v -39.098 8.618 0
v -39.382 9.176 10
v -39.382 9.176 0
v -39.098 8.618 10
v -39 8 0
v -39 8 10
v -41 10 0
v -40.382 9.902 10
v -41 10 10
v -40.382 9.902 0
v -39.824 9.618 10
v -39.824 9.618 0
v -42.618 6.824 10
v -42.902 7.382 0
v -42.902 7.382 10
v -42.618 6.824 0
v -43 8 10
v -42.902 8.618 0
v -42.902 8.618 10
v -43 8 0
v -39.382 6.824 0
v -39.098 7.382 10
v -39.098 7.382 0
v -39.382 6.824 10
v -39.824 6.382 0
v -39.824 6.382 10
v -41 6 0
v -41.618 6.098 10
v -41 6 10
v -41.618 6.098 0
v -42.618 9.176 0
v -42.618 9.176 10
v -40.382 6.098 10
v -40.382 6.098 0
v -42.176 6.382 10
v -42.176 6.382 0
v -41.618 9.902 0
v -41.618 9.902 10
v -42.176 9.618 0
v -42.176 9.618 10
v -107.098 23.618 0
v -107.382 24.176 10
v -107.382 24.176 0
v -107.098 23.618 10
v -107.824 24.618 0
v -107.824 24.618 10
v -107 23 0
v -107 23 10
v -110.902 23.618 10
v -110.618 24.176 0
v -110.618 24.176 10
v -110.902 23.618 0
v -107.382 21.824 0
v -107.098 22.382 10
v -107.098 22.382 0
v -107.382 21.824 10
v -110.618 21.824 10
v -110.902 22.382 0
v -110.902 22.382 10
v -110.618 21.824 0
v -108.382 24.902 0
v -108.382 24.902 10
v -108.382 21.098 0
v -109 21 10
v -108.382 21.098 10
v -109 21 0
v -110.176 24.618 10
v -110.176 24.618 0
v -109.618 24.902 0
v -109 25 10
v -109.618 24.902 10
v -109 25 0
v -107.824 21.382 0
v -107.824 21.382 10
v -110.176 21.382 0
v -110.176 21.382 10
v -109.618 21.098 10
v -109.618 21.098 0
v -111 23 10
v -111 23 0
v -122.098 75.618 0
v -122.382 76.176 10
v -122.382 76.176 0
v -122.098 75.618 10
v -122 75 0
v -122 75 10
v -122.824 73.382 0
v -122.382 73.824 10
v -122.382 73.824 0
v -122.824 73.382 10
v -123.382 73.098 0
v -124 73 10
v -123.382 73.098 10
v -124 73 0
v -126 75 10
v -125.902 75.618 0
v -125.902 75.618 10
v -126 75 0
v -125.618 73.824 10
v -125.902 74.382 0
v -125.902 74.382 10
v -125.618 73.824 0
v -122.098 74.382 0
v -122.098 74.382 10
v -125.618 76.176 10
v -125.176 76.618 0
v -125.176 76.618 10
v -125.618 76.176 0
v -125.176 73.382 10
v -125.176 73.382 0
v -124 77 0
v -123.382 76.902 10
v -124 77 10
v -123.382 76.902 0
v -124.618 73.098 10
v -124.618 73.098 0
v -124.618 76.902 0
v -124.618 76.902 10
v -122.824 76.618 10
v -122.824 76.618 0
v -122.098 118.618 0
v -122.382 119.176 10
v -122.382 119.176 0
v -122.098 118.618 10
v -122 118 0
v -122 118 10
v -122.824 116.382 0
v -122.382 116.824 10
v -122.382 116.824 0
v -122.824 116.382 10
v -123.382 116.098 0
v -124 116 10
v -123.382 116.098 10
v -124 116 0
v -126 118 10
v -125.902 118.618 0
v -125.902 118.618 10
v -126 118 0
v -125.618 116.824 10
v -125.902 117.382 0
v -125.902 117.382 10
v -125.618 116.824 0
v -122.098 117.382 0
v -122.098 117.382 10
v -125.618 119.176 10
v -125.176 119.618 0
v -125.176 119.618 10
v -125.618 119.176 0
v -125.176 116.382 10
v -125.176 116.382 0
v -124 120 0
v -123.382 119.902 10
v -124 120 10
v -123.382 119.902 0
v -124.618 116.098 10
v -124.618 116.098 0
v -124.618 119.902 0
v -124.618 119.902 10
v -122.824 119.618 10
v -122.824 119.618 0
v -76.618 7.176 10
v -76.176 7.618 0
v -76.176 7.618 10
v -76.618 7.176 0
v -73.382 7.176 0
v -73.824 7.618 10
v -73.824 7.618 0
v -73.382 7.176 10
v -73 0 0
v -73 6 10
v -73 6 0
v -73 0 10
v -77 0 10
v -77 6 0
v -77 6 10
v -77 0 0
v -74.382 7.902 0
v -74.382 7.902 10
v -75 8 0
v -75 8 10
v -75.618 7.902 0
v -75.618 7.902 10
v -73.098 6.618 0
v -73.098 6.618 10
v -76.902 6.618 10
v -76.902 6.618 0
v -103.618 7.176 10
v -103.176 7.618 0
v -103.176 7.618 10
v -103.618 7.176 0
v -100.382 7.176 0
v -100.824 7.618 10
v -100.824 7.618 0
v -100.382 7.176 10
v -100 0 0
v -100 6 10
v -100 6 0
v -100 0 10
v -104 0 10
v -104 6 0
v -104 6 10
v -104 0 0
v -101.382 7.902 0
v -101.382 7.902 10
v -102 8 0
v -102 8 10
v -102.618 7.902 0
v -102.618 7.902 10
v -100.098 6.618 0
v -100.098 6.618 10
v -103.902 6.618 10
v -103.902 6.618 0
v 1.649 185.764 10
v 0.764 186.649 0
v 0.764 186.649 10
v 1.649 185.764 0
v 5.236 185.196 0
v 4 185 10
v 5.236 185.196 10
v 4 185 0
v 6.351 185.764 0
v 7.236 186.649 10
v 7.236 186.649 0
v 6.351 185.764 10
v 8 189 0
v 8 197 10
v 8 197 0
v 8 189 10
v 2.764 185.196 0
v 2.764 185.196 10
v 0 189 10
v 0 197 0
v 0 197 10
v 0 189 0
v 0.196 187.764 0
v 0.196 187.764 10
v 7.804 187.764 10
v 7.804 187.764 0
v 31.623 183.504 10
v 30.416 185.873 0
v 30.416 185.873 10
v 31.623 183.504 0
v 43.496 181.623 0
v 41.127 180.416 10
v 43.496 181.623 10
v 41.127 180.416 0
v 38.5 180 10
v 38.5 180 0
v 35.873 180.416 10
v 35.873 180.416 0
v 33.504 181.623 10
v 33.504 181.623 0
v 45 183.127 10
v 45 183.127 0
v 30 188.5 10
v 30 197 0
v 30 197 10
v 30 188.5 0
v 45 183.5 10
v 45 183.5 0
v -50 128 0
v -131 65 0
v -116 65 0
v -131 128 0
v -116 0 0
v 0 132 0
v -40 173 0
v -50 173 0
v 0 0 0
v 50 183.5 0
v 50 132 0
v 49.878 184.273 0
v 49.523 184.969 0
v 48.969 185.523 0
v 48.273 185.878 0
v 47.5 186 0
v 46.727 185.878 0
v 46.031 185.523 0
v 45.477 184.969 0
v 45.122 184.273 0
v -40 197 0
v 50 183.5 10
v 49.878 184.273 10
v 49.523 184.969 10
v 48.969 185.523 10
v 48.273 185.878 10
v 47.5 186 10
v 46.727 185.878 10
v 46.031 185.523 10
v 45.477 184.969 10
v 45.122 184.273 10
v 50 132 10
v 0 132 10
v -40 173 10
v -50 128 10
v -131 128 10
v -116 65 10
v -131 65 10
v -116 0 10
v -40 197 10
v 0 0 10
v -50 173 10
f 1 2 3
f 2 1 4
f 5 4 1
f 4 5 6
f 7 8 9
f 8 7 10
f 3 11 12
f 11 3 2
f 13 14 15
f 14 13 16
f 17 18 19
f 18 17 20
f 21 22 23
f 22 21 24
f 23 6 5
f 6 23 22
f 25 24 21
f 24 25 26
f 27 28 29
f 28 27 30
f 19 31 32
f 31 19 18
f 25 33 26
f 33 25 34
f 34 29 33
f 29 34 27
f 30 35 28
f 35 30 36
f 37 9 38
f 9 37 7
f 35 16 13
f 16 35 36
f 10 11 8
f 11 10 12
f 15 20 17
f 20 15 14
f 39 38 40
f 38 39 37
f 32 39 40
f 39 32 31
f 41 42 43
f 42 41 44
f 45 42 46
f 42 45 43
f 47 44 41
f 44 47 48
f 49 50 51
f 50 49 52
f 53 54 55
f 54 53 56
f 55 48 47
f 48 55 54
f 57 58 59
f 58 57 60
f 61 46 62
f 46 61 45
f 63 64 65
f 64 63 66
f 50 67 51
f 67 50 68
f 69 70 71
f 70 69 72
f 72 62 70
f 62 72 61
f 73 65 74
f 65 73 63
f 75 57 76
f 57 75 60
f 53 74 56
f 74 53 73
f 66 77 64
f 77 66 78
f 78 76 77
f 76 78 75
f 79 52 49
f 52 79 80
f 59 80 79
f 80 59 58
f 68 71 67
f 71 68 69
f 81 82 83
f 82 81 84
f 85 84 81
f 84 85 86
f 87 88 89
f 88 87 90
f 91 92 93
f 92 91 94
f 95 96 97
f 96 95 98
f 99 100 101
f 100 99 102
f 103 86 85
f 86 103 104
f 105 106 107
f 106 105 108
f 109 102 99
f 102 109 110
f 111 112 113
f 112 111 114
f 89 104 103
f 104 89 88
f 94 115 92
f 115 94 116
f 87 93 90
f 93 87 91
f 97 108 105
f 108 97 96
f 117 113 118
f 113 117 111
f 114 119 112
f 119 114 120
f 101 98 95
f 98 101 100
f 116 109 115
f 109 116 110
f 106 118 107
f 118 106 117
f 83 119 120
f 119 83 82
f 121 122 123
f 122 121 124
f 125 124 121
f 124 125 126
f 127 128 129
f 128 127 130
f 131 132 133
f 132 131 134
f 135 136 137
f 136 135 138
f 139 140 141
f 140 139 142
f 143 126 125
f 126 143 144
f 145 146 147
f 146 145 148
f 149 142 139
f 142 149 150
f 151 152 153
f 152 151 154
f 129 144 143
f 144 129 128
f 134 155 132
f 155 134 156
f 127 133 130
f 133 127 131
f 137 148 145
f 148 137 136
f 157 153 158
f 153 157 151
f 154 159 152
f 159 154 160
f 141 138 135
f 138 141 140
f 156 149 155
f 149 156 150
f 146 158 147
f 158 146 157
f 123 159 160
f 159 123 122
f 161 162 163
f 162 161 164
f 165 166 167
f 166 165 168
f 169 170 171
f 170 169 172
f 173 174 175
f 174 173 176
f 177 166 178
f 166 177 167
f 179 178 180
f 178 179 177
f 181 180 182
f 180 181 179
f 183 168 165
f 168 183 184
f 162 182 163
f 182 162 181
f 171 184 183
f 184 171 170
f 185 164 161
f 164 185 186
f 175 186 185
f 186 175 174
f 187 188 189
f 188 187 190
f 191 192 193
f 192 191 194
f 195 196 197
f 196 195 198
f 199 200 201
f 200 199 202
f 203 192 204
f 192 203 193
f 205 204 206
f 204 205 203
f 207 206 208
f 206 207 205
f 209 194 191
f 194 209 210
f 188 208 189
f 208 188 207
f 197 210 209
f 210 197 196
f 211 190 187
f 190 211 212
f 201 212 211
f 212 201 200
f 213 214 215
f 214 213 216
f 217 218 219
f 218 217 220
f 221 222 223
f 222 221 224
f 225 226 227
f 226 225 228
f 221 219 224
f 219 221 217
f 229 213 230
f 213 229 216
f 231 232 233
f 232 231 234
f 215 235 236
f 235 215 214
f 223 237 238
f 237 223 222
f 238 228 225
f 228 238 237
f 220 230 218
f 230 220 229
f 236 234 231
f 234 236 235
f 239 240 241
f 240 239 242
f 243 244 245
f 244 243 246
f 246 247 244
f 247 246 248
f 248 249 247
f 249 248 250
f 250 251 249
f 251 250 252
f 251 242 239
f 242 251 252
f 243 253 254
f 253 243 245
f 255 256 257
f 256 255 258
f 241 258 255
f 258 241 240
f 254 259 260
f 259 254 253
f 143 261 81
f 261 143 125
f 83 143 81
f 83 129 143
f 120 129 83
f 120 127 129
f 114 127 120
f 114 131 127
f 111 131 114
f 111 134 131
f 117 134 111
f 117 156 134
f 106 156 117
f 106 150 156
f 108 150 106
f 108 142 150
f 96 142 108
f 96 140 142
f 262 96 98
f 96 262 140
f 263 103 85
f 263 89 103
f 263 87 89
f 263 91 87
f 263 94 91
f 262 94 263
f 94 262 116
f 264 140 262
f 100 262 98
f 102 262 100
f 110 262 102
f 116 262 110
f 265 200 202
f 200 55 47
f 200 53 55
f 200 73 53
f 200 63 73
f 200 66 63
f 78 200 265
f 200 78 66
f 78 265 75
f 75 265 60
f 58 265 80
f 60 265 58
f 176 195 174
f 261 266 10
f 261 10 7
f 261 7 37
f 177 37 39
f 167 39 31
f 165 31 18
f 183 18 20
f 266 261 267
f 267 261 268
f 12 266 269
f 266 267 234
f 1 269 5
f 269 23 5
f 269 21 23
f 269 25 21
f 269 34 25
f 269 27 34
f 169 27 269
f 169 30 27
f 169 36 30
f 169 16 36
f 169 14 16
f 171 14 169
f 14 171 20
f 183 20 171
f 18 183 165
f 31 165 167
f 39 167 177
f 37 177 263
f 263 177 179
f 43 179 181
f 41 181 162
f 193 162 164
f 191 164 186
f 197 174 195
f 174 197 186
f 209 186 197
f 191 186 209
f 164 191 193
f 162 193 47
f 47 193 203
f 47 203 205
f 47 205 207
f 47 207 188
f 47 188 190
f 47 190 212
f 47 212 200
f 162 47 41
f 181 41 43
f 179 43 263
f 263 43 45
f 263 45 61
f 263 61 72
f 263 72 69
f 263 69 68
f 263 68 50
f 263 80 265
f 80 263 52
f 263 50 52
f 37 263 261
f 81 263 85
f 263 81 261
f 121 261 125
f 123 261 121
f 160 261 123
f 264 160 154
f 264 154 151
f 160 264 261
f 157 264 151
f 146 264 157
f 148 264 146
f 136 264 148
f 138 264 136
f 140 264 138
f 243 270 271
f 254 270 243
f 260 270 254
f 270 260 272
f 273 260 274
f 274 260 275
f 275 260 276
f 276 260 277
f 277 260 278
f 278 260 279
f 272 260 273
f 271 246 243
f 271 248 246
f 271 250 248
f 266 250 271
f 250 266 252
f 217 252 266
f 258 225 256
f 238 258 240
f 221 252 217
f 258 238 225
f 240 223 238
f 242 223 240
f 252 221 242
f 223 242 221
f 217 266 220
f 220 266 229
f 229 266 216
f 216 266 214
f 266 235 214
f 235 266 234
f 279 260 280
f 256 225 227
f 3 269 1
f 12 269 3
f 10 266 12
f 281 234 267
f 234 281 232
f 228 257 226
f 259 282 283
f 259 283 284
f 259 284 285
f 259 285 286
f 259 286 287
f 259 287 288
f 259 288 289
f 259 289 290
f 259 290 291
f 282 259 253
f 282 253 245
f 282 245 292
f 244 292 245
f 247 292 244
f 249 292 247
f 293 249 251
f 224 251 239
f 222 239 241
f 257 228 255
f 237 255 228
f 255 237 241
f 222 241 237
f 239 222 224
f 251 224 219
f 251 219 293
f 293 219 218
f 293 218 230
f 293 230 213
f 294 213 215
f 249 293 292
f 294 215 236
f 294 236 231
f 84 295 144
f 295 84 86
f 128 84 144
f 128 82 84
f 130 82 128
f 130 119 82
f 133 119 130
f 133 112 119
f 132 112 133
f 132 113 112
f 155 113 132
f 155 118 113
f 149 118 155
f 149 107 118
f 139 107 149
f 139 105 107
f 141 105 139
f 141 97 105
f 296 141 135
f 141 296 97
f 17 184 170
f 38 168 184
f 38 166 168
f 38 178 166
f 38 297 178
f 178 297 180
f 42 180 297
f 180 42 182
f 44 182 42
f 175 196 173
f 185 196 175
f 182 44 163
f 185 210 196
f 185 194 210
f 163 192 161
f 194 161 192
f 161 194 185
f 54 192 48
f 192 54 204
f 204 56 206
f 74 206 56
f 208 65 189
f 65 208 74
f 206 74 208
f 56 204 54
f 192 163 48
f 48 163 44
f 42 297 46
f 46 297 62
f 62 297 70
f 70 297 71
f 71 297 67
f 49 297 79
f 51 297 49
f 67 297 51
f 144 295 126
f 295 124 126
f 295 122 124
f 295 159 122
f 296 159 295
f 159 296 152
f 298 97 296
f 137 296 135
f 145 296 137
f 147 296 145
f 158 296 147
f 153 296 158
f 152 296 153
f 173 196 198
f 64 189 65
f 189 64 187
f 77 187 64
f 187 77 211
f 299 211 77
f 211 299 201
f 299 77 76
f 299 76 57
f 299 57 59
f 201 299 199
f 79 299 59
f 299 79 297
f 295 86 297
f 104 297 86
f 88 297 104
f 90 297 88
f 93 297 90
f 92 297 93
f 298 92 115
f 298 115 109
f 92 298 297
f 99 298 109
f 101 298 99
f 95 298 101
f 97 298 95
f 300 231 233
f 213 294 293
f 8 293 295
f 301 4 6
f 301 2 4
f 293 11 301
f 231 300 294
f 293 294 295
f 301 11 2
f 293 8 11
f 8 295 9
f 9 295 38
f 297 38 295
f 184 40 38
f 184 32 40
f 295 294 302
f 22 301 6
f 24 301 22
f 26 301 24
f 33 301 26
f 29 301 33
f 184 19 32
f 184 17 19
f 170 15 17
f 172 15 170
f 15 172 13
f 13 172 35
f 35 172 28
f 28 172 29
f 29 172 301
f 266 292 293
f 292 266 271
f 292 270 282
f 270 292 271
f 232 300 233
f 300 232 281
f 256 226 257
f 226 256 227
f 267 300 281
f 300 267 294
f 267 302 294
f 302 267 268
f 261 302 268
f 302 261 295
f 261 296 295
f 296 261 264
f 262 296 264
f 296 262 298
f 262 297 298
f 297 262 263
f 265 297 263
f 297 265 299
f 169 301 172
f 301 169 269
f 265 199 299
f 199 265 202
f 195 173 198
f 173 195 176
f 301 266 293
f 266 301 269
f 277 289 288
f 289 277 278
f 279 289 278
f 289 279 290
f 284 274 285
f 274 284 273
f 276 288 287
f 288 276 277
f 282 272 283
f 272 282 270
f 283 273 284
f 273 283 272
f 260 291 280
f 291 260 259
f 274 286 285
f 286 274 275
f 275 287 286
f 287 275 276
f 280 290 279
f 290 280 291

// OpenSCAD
pcb_height=10;

module base_pcb() {
  // com port side, [0,0] right lower. Points Counterclockwise
  polygon([
        [0,0],              
        [0,132],
        [50,132],
        [50,132+65],
        [-40,132+65],
        [-40, 173],
        [-50, 173],
        [-50,128],
        [-131,128],
        [-131,65],
        [-116,65],
        [-116,0]]);
};

module extrude_pcb() {
    difference() {
        linear_extrude(pcb_height) base_pcb();
        
        for(i=[0:$children-1]) 
            translate([0,0,-.5]) linear_extrude(pcb_height+1) children(i);
    }
};

module semicircle_rect(w,h) {
    translate([w/2,h-w/2]) circle(d=w);
    translate([0,-1]) square([w,h-w/2+1]);
};

module pcb_screw_hole() {
    circle(d=4);
};


module main_pcb_no_led() {
    extrude_pcb() {
        translate([-41,8]) pcb_screw_hole();
        translate([-109,23]) pcb_screw_hole();
        translate([-124,75]) pcb_screw_hole();
        translate([-124,118]) pcb_screw_hole();
        translate([-77,0,0]) 
            semicircle_rect(4,8); // right bottom insert
        translate([-104,0,0]) 
            semicircle_rect(4,8); // left bottom insert
        translate([8,185+12]) 
            rotate([0,0,180]) semicircle_rect(8,12); // left top insert
        translate([30+17,180+17])
            rotate([0,0,180]) semicircle_rect(17,17); // right top insert
        translate([45,180]) square([15,25]);
    };
};

// add space for superior right led
union() {
  main_pcb_no_led();
  linear_extrude(pcb_height) translate([50-5,180+1]) semicircle_rect(5,5);  
}

$fn=20;
